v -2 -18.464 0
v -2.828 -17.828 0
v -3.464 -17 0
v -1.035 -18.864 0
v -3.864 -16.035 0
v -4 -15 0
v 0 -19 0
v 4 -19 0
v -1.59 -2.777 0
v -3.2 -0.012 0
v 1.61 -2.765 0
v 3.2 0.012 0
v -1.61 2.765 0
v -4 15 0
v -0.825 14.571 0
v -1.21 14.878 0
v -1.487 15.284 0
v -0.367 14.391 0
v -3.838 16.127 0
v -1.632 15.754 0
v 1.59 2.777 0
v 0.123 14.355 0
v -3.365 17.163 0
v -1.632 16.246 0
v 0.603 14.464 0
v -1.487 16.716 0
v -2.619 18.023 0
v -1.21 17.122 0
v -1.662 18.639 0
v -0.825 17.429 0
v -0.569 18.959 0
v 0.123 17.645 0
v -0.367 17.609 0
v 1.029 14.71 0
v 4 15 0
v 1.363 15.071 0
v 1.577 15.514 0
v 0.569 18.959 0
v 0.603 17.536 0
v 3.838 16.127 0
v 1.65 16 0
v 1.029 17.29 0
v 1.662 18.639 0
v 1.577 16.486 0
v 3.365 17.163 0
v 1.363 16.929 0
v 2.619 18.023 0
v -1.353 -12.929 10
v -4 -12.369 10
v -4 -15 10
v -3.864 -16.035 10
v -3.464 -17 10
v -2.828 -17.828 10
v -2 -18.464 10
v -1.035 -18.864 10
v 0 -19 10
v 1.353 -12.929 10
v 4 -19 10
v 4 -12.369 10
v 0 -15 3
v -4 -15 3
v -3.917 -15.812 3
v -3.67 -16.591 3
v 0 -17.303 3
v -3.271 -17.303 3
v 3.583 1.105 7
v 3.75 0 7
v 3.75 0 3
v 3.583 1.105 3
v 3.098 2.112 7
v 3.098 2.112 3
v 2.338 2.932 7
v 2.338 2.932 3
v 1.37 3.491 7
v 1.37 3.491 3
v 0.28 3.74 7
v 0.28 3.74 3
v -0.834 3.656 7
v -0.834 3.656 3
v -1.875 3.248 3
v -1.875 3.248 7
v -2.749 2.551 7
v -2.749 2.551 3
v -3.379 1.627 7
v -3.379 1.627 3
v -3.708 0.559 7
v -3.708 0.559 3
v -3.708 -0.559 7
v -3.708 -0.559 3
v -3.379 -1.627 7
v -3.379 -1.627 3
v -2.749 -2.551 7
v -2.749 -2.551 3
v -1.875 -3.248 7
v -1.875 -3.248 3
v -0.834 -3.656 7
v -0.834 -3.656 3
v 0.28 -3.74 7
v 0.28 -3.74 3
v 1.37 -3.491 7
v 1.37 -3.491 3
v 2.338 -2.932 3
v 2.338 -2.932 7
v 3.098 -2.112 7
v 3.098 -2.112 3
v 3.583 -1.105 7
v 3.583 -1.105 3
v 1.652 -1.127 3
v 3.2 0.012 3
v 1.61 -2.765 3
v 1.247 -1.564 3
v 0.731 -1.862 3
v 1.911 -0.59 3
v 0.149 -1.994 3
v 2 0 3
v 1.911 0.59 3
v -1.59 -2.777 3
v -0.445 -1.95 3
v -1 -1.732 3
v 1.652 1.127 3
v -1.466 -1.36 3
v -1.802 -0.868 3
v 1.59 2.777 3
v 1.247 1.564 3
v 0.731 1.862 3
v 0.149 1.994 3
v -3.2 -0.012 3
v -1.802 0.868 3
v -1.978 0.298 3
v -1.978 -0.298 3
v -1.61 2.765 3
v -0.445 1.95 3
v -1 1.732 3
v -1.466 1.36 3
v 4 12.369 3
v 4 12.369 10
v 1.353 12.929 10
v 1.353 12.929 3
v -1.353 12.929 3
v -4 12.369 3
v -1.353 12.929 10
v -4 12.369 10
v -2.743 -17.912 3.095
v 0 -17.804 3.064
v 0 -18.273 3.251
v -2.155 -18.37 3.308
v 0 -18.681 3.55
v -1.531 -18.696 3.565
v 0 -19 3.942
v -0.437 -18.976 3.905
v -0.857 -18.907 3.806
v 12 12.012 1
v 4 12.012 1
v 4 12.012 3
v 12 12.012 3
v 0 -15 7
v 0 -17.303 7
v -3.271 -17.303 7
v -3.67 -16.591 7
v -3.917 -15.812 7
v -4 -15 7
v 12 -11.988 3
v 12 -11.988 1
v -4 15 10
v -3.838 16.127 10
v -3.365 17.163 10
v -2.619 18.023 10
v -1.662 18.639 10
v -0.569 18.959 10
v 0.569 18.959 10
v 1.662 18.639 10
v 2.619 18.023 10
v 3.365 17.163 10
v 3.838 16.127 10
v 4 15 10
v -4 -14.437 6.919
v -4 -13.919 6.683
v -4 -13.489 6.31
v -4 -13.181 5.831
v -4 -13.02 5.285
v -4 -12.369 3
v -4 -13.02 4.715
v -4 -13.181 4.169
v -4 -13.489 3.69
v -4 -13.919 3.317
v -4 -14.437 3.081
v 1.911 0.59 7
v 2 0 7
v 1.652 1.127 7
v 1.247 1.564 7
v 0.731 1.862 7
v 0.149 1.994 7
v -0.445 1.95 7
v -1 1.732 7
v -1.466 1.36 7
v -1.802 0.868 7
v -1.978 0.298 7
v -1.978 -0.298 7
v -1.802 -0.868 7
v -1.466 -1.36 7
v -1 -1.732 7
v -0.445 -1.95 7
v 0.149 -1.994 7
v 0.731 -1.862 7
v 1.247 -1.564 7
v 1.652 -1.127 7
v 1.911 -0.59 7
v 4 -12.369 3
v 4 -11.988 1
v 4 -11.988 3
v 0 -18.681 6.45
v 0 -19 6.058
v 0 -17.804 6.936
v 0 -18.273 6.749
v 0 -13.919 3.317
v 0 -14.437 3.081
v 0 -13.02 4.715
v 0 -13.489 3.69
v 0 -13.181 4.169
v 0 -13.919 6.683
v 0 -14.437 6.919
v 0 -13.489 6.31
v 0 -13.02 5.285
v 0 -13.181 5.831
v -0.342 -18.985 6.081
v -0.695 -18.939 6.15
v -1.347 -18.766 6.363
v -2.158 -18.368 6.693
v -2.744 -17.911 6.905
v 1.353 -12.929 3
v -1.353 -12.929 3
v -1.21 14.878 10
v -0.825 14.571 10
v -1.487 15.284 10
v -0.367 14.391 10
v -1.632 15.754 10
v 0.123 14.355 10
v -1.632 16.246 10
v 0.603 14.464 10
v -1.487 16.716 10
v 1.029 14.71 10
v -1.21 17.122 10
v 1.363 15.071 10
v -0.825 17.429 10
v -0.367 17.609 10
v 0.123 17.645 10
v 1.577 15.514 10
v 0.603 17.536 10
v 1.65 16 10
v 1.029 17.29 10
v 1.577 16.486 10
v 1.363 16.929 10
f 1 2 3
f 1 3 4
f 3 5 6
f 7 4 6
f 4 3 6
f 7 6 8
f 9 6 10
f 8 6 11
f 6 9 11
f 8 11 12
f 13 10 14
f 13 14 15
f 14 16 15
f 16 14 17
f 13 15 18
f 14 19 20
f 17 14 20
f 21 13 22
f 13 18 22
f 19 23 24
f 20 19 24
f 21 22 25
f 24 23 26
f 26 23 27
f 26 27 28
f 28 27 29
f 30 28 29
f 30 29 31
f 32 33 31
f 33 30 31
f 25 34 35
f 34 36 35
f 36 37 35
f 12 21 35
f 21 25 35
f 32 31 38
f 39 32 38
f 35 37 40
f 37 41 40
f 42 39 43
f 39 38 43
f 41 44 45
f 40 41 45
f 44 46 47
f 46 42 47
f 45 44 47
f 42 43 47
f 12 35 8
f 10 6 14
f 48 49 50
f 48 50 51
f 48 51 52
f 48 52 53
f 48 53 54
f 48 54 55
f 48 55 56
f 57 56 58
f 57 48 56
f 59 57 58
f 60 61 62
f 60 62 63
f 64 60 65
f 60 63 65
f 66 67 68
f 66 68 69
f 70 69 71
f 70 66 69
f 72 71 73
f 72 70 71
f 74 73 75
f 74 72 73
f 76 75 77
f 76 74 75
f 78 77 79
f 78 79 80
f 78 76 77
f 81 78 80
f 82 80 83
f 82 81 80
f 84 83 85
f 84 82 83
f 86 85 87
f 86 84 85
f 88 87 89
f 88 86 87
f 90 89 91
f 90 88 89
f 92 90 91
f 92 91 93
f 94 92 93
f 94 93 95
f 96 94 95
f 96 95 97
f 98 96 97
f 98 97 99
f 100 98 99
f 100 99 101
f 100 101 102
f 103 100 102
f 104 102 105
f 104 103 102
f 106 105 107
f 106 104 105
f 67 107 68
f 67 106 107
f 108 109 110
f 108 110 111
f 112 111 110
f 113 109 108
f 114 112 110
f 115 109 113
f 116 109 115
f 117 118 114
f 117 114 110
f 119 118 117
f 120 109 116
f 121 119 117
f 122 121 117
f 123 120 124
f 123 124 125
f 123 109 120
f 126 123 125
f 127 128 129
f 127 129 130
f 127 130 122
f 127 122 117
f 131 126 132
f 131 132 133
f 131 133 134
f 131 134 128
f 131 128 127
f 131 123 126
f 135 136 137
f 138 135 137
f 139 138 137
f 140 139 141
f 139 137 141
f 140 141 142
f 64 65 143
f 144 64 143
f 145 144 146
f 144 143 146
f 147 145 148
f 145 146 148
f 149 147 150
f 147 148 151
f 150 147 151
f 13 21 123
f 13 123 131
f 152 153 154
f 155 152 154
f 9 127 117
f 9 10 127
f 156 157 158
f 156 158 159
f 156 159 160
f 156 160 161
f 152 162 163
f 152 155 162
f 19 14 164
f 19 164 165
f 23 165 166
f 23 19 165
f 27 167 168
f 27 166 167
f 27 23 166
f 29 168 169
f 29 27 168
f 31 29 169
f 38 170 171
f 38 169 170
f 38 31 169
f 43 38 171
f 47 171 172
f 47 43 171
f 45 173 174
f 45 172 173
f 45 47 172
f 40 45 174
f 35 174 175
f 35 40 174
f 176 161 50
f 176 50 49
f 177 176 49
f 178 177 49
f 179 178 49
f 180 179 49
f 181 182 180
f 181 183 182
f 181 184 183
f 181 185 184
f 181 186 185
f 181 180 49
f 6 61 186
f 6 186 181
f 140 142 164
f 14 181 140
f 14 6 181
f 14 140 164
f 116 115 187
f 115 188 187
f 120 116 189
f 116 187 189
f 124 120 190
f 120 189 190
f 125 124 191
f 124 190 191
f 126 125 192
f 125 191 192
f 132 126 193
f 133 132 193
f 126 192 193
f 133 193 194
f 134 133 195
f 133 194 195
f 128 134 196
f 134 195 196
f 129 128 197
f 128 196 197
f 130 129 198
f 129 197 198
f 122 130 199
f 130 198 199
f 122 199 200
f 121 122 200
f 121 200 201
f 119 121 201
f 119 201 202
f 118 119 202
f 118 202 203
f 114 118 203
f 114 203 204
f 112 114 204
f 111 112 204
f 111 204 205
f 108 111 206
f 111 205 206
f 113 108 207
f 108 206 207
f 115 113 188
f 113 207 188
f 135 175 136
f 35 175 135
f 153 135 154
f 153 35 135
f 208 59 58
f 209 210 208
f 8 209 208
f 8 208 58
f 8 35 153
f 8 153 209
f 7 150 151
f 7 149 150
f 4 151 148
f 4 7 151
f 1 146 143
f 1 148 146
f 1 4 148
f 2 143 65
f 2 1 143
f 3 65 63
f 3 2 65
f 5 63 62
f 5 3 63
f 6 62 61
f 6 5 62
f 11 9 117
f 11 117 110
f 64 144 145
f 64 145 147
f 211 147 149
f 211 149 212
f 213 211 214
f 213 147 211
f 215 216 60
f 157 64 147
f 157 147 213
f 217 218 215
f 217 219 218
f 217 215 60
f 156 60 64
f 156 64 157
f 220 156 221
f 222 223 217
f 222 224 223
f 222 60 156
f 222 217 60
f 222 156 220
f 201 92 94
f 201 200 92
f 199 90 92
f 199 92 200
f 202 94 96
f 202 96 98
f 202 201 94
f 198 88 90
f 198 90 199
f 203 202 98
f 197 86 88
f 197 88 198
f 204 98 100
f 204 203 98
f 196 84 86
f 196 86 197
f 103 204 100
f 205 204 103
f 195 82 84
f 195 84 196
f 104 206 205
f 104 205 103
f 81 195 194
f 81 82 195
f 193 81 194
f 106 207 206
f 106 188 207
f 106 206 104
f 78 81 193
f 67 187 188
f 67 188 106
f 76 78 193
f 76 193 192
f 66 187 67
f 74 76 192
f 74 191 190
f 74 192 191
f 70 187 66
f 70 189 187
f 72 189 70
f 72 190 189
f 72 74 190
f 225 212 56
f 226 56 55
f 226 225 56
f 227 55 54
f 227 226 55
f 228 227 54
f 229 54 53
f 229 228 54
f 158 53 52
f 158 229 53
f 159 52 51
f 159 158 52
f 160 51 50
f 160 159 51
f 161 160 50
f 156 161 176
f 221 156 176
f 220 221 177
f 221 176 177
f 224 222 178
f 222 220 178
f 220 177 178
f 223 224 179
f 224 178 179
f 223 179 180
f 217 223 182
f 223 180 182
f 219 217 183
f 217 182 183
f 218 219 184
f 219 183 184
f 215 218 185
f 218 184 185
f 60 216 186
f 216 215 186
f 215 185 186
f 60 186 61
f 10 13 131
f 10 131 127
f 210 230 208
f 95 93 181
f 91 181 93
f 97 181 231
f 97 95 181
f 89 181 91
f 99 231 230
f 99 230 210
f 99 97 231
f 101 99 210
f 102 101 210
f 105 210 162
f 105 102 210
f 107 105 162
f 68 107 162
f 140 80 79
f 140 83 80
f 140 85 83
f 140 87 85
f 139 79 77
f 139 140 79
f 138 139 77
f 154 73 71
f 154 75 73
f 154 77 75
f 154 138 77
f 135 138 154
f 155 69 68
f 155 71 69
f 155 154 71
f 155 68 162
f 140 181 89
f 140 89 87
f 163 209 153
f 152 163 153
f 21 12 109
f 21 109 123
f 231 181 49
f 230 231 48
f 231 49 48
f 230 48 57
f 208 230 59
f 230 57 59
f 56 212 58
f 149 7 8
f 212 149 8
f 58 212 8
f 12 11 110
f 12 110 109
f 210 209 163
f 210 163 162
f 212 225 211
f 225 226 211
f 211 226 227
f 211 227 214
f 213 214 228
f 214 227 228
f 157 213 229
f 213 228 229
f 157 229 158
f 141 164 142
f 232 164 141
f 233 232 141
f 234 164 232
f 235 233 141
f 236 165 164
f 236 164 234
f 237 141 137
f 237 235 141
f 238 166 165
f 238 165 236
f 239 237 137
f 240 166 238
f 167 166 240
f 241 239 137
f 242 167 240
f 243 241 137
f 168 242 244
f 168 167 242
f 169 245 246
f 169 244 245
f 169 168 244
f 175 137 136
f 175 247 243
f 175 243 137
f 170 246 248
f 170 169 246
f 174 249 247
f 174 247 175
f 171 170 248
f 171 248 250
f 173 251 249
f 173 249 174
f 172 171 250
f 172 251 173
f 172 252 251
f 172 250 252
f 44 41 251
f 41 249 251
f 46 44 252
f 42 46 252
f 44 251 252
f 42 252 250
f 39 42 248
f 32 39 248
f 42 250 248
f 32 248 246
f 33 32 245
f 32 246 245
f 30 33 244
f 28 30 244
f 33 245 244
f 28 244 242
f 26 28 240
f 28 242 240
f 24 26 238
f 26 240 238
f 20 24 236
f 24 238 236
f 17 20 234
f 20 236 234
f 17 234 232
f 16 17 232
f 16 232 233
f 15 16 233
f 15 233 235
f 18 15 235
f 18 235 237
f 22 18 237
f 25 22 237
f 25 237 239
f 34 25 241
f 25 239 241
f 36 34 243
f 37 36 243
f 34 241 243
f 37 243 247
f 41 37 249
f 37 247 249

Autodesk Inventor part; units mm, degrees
ref_plane "YZ Plane" through (0, 0, 0) normal (1, 0, 0) x (0, 1, 0)
ref_plane "XZ Plane" through (0, 0, 0) normal (0, 1, 0) x (-1, 0, 0)
ref_plane "XY Plane" through (0, 0, 0) normal (0, 0, 1) x (1, 0, 0)
sketch "Sketch1" plane through (0, 0, 0) normal (0, 0, 1) x (1, 0, 0)
  line L0 (0, -15) -> (0, 15) construction
  line L1 (-4, -15) -> (-4, 15)
  line L2 (4, 15) -> (4, -15)
  arc A0 (-4, -15) -> (0, -19) centre (0, -15) ccw
  arc A1 (4, 15) -> (-4, 15) centre (0, 15) ccw
  line L3 (4, -15) -> (0, -15)
  line L4 (-4, -11) -> (-4, -19)
  line L5 (-4, -19) -> (4, -19)
  line L6 (4, -19) -> (4, -15)
  point P0 (0, 0)
  point P1 (0, 0)
  dimension "d0" = 4
  dimension "d17" = 30
extrude "Extrusion1" add sketch "Sketch1" along normal blind 10 contours L1 A1 L2 L6 L5 A0
sketch "Sketch2" plane through (0, 0, 10) normal (0, 0, 1) x (1, 0, 0)
  line L0 (-4, 15) -> (-4, -15) projected
  arc A0 (-4, -15) -> (0, -19) centre (0, -15) ccw projected
  line L1 (4, -19) -> (4, 15) projected
  arc A1 (4, 15) -> (-4, 15) centre (0, 15) ccw projected
  circle A2 centre (0, 0) radius 13
  circle A3 centre (0, 0) radius 3.75
  line L2 (0, -19) -> (4, -19) projected
  dimension "d3" = 26
  dimension "d4" = 7.5
extrude "Extrusion2" cut sketch "Sketch2" against normal blind 7 contours A2 L1 L0 | L0 A2 | A2 L1
sketch "Sketch3" plane through (0, 0, 10) normal (0, 0, 1) x (1, 0, 0)
  circle A0 centre (0, 0) radius 3.75 projected
  circle A1 centre (0, 0) radius 2
  line L0 (-4, 15) -> (-4, 12.3693) projected
  line L1 (4, -19) -> (4, -12.3693) projected
  arc A2 (4, 12.3693) -> (-4, 12.3693) centre (0, 0) ccw projected
  line L2 (4, 12.3693) -> (4, 15) projected
  arc A3 (4, 15) -> (-4, 15) centre (0, 15) ccw projected
  arc A4 (-4, -12.3693) -> (4, -12.3693) centre (0, 0) ccw projected
  line L3 (-4, -12.3693) -> (-4, -15) projected
  arc A5 (-4, -15) -> (0, -19) centre (0, -15) ccw projected
  line L4 (0, -19) -> (4, -19) projected
  dimension "d7" = 4
extrude "Extrusion3" cut sketch "Sketch3" against normal through all contours A1
sketch "Sketch4" plane through (0, 0, 0) normal (0, 0, -1) x (-1, 0, 0)
  circle A0 centre (0, 0) radius 2 projected
  line L0 (4, -15) -> (4, 15) projected
  arc A1 (4, 15) -> (-4, 15) centre (0, 15) ccw projected
  line L1 (-4, 15) -> (-4, -19) projected
  arc A2 (0, -19) -> (4, -15) centre (0, -15) ccw projected
  circle A3 centre (0, 0) radius 2 projected
  line L2 (1.5898, -2.7772) -> (-1.6102, -2.7654)
  line L3 (-1.6102, -2.7654) -> (-3.2, 0.0118)
  line L4 (-3.2, 0.0118) -> (-1.5898, 2.7772)
  line L5 (-1.5898, 2.7772) -> (1.6102, 2.7654)
  line L6 (1.6102, 2.7654) -> (3.2, -0.0118)
  line L7 (3.2, -0.0118) -> (1.5898, -2.7772)
  circle A4 centre (0, 0) radius 3.2
  line L8 (-4, -19) -> (0, -19) projected
  dimension "d10" = 6.4
extrude "Extrusion4" cut sketch "Sketch4" against normal blind 3 contours L2 L3 L4 L5 L6 L7
sketch "Sketch8" plane through (0, 0, 10) normal (0, 0, 1) x (1, 0, 0)
  arc A0 (4, 12.3693) -> (-4, 12.3693) centre (0, 0) ccw projected
  line L0 (4, 12.3693) -> (4, 15) projected
  arc A1 (4, 15) -> (-4, 15) centre (0, 15) ccw projected
  line L1 (-4, 15) -> (-4, 12.3693) projected
  circle A2 centre (0, 16) radius 1.65
  dimension "d28" = 3.3
extrude "Extrusion8" cut sketch "Sketch8" against normal through all contours A2
sketch "Sketch9" plane through (-4, -15, 0) normal (-1, 0, 0) x (0, 0, 1)
  line L0 (0, 0) -> (10, 0) projected
  line L1 (5, 0) -> (5, -2.3027) construction
  line L2 (3, 0) -> (3, -2.3027)
  line L3 (7, -2.3027) -> (7, 0)
  arc A0 (7, 0) -> (3, 0) centre (5, 0) ccw
  arc A1 (3, -2.3027) -> (7, -2.3027) centre (5, -2.3027) ccw
  line L4 (3, 2.6307) -> (3, 27.3693) projected
  point P0 (0, 15)
  point P1 (5, -1.1513)
  dimension "d31" = 4
  dimension "d34" = 2
extrude "Extrusion9" cut sketch "Sketch9" against normal blind 4
sketch "Sketch10" plane through (0, 0, 10) normal (0, 0, 1) x (1, 0, 0)
  circle A0 centre (0, 0) radius 2 projected
  circle A1 centre (0, 0) radius 2 projected
  circle A2 centre (0, 0) radius 3.75 projected
extrude "Extrusion10" cut sketch "Sketch10" against normal blind 3
sketch "Sketch12" plane through (4, -19, 0) normal (1, 0, 0) x (0, 0, -1)
  line L0 (-3, 19.0118) -> (-1, 19.0118)
  line L1 (-1, 19.0118) -> (-1, 7.0118)
  line L2 (-1, 7.0118) -> (-3, 7.0118)
  line L3 (-3, 7.0118) -> (-3, 19.0118)
  line L4 (-1, 19.0118) -> (-1, 31.0118)
  line L5 (-1, 31.0118) -> (-3, 31.0118)
  line L6 (-3, 31.0118) -> (-3, 19.0118)
  point P0 (0, 19)
  dimension "d40" = 12
  dimension "d41" = 2
extrude "Extrusion11" add sketch "Sketch12" along normal blind 8
properties part number "rodamiento"
